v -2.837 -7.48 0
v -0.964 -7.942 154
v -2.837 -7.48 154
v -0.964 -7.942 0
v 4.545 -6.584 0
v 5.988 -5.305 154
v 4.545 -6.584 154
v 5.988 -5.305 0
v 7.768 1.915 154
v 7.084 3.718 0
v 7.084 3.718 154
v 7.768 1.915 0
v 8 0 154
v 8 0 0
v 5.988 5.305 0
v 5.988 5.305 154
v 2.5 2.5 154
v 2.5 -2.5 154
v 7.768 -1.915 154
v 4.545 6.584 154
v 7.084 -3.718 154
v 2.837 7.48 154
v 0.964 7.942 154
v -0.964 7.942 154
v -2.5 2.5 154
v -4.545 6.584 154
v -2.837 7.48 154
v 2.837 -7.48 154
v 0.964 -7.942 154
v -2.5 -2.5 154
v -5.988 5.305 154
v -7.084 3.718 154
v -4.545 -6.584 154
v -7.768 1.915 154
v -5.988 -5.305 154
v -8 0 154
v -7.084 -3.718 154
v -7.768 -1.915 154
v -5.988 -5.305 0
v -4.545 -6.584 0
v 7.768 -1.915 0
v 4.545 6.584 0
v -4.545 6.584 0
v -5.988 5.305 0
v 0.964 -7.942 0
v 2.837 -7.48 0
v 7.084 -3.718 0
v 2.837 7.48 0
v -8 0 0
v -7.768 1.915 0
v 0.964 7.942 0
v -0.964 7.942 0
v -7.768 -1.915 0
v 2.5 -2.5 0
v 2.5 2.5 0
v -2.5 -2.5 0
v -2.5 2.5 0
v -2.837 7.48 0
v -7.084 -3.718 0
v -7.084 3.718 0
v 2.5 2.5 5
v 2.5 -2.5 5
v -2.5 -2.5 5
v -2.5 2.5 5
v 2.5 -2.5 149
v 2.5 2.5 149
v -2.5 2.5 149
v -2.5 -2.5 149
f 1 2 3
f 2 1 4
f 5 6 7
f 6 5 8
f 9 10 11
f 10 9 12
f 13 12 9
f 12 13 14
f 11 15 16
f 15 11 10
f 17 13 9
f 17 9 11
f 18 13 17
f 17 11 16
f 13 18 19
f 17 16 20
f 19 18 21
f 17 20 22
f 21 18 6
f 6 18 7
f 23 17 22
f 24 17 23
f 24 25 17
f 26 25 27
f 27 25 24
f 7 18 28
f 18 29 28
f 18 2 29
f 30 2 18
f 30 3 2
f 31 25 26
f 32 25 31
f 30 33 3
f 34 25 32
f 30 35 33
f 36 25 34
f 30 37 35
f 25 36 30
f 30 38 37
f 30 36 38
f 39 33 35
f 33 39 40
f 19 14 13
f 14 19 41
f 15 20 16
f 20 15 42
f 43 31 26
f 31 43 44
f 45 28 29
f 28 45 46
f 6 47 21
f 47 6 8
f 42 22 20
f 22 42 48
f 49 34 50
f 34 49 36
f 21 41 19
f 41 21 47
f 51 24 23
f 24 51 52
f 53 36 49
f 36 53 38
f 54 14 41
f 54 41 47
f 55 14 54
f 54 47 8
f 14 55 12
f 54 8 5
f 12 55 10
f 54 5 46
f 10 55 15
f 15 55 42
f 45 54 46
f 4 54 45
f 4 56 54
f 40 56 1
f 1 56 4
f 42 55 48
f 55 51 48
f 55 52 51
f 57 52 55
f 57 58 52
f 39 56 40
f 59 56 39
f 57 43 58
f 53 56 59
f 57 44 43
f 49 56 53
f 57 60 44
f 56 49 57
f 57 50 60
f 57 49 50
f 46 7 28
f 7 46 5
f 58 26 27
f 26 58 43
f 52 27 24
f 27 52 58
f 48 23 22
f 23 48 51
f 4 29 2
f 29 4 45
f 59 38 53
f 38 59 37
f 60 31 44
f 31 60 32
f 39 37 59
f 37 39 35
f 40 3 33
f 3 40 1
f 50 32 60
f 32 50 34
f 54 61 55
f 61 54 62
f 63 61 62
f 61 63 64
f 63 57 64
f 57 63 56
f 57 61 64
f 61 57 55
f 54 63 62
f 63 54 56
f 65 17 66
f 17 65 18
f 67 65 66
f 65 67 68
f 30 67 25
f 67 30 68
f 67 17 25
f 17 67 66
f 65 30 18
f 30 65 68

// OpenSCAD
m_plate_depth = 150;
o_roller_overlap = 2;
o_roller_radius = 8;
o_bearing_contact = 2;
o_cube_size = 5;

c_roller_length = m_plate_depth + 2*(o_roller_overlap);




difference(){

	cylinder( h=c_roller_length, r=o_roller_radius);

	translate(v=[-o_cube_size/2,-o_cube_size/2,0]){
		cube(size=[o_cube_size,o_cube_size,o_cube_size]);
	}
	translate(v=[-o_cube_size/2,-o_cube_size/2,c_roller_length-o_cube_size]){
		cube(size=[o_cube_size,o_cube_size,o_cube_size]);
	}
}
